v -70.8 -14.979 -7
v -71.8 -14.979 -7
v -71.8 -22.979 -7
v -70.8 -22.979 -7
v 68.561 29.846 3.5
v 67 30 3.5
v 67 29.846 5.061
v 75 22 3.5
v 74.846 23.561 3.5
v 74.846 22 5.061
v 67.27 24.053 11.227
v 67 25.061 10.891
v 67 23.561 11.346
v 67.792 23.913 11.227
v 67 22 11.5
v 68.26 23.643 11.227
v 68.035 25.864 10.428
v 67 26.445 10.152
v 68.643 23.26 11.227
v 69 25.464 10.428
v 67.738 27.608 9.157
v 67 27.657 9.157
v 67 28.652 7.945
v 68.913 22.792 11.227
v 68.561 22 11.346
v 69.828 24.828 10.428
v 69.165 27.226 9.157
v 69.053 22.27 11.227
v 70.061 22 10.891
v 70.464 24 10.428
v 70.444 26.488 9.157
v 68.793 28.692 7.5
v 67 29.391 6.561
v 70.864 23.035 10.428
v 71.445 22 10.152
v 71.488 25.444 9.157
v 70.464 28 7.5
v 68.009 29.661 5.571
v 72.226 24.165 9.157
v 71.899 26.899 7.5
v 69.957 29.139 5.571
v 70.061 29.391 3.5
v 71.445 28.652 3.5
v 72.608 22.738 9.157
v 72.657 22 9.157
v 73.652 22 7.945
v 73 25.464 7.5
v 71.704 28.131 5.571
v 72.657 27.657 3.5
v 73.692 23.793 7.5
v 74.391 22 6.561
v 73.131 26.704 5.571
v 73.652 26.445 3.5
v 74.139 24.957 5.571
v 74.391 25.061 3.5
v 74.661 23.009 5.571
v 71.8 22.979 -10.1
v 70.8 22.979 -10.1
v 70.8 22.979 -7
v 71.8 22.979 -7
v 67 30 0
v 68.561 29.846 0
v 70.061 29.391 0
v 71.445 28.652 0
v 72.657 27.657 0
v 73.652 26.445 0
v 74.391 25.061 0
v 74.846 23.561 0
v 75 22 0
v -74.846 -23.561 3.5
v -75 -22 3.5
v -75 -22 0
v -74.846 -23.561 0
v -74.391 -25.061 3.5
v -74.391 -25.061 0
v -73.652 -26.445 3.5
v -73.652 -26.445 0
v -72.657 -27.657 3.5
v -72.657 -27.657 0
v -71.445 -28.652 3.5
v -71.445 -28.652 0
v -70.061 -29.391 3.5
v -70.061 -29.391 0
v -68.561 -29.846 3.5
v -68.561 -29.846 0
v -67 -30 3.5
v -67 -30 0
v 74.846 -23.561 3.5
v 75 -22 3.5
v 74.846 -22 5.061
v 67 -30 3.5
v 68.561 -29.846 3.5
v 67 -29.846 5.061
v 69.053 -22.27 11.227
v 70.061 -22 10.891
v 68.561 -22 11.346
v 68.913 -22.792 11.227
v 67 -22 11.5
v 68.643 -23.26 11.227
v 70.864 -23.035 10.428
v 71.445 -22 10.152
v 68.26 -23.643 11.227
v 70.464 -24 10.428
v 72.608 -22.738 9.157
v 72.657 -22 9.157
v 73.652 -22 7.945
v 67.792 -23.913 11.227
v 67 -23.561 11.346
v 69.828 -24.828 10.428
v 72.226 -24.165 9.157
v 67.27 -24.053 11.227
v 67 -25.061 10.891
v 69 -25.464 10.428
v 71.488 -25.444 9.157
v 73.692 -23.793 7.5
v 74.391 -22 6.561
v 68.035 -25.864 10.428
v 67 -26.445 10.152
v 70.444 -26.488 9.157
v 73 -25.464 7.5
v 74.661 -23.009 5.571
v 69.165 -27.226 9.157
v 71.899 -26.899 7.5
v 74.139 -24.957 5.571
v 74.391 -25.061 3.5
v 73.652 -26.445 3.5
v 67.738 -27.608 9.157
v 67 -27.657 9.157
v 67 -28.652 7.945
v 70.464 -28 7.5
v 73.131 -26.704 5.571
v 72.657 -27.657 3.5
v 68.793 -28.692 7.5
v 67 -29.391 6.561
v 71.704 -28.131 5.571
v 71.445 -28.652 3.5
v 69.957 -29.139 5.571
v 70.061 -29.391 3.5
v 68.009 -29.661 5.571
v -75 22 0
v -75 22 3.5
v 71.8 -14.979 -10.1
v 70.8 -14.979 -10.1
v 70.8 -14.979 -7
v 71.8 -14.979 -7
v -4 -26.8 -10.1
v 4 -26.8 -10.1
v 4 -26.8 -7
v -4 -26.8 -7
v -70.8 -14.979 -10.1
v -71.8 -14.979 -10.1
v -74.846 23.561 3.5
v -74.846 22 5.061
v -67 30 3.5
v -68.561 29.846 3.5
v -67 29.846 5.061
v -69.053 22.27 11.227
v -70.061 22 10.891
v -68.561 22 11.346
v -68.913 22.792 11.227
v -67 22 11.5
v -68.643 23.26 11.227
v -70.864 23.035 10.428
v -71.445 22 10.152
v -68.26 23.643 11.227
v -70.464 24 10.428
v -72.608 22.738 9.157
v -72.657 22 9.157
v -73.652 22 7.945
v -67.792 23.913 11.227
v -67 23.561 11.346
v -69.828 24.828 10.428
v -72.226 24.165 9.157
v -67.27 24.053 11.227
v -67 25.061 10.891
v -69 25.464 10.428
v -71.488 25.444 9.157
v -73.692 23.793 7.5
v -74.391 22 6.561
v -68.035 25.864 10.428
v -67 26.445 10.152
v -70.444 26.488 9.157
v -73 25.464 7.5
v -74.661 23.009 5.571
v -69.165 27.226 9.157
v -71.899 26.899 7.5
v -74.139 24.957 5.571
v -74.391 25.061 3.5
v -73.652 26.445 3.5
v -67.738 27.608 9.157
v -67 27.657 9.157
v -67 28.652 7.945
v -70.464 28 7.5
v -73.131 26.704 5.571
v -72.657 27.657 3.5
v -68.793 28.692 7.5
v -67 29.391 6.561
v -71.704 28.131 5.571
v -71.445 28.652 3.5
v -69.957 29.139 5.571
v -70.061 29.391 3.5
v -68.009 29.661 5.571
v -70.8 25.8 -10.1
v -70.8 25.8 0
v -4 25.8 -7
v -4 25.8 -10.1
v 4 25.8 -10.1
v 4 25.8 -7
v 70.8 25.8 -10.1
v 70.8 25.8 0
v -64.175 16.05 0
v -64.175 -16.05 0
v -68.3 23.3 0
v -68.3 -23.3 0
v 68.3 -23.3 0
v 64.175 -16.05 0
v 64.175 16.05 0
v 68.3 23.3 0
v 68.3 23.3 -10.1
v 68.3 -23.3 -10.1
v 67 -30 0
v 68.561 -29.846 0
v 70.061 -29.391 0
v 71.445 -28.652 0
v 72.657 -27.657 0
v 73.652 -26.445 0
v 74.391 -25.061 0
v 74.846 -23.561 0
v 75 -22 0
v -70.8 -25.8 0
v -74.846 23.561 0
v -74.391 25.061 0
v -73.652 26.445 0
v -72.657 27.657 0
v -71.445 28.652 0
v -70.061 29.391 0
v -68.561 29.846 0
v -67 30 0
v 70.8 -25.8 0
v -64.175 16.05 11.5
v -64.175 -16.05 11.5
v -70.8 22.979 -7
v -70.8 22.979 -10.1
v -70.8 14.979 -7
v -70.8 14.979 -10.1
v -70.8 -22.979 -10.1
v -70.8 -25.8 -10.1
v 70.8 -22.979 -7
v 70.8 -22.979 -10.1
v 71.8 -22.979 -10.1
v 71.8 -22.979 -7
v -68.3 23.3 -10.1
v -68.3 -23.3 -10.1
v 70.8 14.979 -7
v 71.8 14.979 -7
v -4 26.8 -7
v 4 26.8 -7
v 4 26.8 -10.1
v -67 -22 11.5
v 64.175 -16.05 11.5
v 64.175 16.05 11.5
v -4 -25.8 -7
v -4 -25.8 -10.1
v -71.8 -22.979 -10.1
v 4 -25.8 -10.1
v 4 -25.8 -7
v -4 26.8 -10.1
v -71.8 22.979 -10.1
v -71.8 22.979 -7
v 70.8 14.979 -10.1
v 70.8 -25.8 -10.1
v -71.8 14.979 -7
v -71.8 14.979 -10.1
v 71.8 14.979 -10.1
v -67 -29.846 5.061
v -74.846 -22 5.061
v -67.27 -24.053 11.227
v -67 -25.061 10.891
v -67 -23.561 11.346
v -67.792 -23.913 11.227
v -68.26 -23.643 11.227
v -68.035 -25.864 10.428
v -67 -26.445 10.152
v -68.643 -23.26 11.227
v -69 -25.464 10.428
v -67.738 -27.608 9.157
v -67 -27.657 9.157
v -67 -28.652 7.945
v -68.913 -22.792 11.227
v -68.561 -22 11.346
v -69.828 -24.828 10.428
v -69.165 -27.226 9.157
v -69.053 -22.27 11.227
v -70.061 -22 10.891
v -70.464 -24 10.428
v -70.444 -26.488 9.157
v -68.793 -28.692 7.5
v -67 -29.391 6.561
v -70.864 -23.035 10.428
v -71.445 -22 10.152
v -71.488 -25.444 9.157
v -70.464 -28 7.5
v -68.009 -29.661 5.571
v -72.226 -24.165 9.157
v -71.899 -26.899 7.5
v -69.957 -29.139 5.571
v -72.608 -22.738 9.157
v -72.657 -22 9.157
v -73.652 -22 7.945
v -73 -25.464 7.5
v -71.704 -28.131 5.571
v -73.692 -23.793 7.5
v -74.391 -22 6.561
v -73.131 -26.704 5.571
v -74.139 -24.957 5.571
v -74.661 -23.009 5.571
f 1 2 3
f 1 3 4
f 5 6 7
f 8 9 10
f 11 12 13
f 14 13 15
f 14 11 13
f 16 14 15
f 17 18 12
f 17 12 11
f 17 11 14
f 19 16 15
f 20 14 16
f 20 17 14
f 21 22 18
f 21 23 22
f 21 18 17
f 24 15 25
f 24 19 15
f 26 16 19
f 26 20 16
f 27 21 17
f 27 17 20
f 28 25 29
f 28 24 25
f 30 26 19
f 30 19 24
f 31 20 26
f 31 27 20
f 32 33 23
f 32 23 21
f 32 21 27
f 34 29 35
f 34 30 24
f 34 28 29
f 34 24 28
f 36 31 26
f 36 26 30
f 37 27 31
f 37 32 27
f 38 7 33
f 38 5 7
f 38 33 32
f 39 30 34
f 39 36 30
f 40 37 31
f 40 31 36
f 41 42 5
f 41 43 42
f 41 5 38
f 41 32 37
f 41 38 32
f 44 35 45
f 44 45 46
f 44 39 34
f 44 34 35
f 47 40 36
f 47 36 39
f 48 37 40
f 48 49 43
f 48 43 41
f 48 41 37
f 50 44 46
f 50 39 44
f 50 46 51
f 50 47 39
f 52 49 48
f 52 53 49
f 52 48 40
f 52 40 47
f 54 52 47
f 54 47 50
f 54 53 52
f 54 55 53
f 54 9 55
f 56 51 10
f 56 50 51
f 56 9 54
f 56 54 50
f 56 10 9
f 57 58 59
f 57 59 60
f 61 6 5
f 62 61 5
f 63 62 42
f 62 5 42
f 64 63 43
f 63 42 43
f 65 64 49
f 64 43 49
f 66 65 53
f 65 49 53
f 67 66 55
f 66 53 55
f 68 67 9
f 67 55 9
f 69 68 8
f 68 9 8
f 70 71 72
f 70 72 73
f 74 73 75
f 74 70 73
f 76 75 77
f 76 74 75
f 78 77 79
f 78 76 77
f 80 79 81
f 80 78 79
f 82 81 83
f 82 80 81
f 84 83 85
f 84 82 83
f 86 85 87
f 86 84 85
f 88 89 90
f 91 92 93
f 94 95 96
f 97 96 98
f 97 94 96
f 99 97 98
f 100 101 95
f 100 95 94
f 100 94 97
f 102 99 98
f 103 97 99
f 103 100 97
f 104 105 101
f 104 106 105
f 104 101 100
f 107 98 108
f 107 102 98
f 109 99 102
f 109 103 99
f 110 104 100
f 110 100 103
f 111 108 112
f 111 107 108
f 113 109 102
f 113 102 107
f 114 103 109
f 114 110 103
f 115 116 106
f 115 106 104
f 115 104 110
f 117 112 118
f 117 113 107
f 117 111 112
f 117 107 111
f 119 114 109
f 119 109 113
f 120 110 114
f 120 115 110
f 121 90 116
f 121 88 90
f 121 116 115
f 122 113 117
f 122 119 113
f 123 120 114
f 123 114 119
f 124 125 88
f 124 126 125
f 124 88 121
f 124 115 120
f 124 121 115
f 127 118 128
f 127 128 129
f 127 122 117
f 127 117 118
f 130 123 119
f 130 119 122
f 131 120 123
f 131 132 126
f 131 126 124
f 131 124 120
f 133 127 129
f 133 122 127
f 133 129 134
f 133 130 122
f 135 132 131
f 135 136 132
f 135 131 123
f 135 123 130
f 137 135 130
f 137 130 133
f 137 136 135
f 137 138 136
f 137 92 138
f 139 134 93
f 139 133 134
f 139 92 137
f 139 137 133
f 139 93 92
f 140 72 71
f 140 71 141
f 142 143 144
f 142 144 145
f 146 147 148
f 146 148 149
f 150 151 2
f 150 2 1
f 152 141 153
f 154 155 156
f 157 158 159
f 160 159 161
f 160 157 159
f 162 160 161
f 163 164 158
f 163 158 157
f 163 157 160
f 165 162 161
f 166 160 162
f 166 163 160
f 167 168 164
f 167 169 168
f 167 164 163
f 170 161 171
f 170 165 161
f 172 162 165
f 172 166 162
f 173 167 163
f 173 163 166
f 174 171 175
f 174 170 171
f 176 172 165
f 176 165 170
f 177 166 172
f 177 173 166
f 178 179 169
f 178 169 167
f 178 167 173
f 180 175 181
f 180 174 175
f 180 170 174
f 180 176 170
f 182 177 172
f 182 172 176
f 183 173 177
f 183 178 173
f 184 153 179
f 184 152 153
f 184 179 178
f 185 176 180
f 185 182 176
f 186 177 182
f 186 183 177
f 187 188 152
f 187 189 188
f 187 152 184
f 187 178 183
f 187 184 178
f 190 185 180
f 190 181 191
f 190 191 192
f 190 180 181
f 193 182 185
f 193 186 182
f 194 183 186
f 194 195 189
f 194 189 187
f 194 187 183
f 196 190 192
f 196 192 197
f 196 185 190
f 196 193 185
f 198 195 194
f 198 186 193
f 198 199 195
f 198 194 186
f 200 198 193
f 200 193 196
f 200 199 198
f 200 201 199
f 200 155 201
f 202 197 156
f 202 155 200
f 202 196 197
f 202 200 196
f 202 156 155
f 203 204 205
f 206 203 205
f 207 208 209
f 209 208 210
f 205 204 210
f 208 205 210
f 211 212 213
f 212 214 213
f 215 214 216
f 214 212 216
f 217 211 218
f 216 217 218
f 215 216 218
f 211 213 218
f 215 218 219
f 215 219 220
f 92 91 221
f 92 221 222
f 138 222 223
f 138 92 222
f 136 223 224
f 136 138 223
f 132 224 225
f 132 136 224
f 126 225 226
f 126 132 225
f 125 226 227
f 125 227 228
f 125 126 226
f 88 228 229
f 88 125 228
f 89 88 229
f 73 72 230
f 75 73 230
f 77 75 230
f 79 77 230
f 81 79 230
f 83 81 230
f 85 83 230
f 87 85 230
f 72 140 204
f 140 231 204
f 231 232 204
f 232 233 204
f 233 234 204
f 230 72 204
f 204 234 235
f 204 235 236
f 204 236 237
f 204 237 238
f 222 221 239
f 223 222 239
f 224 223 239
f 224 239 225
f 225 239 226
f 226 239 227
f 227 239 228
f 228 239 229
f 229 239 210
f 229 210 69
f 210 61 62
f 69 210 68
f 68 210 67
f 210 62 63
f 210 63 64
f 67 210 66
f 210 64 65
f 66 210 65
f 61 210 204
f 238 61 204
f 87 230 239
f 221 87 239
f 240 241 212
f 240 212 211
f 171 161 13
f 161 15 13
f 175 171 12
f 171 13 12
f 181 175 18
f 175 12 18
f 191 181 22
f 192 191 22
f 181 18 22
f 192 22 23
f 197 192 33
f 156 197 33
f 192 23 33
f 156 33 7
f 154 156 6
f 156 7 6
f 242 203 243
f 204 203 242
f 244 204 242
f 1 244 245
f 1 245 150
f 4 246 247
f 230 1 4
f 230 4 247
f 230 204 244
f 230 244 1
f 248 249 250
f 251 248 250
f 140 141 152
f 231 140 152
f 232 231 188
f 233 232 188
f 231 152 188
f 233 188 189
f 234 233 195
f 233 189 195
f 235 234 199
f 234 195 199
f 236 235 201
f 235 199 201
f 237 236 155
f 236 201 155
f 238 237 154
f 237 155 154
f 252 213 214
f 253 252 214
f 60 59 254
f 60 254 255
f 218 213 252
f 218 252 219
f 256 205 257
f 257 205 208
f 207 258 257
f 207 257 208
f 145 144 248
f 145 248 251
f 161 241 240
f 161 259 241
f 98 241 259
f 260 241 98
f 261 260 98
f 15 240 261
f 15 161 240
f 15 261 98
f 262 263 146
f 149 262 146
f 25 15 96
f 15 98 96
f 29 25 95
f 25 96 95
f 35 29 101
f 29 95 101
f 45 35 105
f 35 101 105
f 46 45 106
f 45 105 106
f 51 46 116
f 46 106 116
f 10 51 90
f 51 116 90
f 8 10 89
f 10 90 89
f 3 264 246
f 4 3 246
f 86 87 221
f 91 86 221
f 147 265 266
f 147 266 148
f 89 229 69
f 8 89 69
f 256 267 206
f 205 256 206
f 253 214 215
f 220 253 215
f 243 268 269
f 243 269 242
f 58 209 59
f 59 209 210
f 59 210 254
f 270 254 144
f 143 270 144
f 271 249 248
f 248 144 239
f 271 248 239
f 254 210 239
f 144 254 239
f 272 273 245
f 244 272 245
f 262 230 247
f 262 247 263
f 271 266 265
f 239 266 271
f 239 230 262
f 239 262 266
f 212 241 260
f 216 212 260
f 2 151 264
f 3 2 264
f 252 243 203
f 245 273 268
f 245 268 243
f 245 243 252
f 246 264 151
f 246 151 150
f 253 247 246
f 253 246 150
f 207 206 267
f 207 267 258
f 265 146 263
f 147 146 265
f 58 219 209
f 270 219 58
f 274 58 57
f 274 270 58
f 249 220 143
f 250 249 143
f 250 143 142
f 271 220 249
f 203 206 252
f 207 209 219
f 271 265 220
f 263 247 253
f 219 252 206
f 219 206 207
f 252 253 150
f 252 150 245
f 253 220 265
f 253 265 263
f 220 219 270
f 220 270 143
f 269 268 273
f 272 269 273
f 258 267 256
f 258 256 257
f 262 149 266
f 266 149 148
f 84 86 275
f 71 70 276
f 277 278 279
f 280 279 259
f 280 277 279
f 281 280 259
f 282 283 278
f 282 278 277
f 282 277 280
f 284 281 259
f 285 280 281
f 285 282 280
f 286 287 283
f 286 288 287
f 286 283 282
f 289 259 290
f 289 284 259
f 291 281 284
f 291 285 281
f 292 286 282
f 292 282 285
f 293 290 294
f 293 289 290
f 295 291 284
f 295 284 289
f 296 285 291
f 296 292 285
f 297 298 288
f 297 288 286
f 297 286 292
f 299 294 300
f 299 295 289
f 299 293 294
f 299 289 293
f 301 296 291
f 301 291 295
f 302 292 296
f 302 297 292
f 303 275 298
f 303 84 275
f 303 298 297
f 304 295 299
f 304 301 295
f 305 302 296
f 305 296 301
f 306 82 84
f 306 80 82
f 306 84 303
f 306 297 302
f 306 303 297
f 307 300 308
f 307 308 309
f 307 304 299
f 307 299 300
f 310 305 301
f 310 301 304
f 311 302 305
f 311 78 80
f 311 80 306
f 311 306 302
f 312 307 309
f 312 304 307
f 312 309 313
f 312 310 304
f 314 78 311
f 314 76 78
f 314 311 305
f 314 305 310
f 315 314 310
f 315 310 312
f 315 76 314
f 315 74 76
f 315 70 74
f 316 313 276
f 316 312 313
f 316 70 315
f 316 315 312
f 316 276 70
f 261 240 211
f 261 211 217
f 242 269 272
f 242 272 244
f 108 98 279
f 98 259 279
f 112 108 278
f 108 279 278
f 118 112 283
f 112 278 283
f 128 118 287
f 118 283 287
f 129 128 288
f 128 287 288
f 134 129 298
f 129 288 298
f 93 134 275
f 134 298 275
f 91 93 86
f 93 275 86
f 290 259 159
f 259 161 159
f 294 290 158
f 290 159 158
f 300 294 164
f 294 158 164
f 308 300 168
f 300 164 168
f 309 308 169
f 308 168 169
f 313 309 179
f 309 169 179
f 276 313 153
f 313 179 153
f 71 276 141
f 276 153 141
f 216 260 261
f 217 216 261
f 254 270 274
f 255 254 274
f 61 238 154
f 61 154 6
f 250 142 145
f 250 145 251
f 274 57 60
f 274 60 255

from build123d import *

# Parameters (mm, degrees)
F0_W      = 150
F0_H      = 60
F1_DEPTH  = 11.5
F2_W      = 128.35
F2_H      = 32.1
F3_DEPTH  = 11.5
F4_R      = 8
F5_W      = 141.6
F5_H      = 51.6
F5_W_2    = 136.6
F5_H_2    = 46.6
F6_DEPTH  = 10.1
F7_R      = 8
F8_W      = 1
F8_H      = 8
F8_W_2    = 4
F8_H_2    = 1
F10_DEPTH = 3.1


with BuildPart() as f1:
    # F0 (on Top) → F1 (new body)
    with BuildSketch(Plane.XY):
        Rectangle(F0_W, F0_H)
    extrude(amount=F1_DEPTH)

    # F2 (on face) → F3 (cut, through all)
    with BuildSketch(Plane.XY.offset(11.5)):
        Rectangle(F2_W, F2_H)
    extrude(amount=-F3_DEPTH, mode=Mode.SUBTRACT)

    # F4
    f4_edges = [f1.edges().sort_by_distance(p)[0] for p in [
        (-75, 30, 5.75),
        (75, 30, 5.75),
        (75, -30, 5.75),
        (-75, -30, 5.75),
    ]]
    fillet(f4_edges, radius=F4_R)

    # F5 (on face) → F6 (join)
    with BuildSketch(Plane(origin=(0, 0, 0), x_dir=(1, 0, 0), z_dir=(0, 0, -1))):
        Rectangle(F5_W, F5_H)
        Rectangle(F5_W_2, F5_H_2, mode=Mode.SUBTRACT)
    extrude(amount=F6_DEPTH)

    # F7
    f7_edges = [f1.edges().sort_by_distance(p)[0] for p in [
        (0, 30, 11.5),
    ]]
    fillet(f7_edges, radius=F7_R)

    # F8 (on face) → F10 (join, through all)
    with BuildSketch(Plane(origin=(0, 0, -10.1), x_dir=(1, 0, 0), z_dir=(0, 0, -1))):
        with Locations((-71.3, 18.978567)):
            Rectangle(F8_W, F8_H)
        with Locations((71.3, 18.978567)):
            Rectangle(F8_W, F8_H)
        with Locations((-71.3, -18.978567)):
            Rectangle(F8_W, F8_H)
        with Locations((71.3, -18.978567)):
            Rectangle(F8_W, F8_H)
        with Locations((2, 26.3)):
            Rectangle(F8_W_2, F8_H_2)
        with Locations((-2, 26.3)):
            Rectangle(F8_W_2, F8_H_2)
        with Locations((2, -26.3)):
            Rectangle(F8_W_2, F8_H_2)
        with Locations((-2, -26.3)):
            Rectangle(F8_W_2, F8_H_2)
    extrude(amount=-F10_DEPTH)


solid = f1.part
